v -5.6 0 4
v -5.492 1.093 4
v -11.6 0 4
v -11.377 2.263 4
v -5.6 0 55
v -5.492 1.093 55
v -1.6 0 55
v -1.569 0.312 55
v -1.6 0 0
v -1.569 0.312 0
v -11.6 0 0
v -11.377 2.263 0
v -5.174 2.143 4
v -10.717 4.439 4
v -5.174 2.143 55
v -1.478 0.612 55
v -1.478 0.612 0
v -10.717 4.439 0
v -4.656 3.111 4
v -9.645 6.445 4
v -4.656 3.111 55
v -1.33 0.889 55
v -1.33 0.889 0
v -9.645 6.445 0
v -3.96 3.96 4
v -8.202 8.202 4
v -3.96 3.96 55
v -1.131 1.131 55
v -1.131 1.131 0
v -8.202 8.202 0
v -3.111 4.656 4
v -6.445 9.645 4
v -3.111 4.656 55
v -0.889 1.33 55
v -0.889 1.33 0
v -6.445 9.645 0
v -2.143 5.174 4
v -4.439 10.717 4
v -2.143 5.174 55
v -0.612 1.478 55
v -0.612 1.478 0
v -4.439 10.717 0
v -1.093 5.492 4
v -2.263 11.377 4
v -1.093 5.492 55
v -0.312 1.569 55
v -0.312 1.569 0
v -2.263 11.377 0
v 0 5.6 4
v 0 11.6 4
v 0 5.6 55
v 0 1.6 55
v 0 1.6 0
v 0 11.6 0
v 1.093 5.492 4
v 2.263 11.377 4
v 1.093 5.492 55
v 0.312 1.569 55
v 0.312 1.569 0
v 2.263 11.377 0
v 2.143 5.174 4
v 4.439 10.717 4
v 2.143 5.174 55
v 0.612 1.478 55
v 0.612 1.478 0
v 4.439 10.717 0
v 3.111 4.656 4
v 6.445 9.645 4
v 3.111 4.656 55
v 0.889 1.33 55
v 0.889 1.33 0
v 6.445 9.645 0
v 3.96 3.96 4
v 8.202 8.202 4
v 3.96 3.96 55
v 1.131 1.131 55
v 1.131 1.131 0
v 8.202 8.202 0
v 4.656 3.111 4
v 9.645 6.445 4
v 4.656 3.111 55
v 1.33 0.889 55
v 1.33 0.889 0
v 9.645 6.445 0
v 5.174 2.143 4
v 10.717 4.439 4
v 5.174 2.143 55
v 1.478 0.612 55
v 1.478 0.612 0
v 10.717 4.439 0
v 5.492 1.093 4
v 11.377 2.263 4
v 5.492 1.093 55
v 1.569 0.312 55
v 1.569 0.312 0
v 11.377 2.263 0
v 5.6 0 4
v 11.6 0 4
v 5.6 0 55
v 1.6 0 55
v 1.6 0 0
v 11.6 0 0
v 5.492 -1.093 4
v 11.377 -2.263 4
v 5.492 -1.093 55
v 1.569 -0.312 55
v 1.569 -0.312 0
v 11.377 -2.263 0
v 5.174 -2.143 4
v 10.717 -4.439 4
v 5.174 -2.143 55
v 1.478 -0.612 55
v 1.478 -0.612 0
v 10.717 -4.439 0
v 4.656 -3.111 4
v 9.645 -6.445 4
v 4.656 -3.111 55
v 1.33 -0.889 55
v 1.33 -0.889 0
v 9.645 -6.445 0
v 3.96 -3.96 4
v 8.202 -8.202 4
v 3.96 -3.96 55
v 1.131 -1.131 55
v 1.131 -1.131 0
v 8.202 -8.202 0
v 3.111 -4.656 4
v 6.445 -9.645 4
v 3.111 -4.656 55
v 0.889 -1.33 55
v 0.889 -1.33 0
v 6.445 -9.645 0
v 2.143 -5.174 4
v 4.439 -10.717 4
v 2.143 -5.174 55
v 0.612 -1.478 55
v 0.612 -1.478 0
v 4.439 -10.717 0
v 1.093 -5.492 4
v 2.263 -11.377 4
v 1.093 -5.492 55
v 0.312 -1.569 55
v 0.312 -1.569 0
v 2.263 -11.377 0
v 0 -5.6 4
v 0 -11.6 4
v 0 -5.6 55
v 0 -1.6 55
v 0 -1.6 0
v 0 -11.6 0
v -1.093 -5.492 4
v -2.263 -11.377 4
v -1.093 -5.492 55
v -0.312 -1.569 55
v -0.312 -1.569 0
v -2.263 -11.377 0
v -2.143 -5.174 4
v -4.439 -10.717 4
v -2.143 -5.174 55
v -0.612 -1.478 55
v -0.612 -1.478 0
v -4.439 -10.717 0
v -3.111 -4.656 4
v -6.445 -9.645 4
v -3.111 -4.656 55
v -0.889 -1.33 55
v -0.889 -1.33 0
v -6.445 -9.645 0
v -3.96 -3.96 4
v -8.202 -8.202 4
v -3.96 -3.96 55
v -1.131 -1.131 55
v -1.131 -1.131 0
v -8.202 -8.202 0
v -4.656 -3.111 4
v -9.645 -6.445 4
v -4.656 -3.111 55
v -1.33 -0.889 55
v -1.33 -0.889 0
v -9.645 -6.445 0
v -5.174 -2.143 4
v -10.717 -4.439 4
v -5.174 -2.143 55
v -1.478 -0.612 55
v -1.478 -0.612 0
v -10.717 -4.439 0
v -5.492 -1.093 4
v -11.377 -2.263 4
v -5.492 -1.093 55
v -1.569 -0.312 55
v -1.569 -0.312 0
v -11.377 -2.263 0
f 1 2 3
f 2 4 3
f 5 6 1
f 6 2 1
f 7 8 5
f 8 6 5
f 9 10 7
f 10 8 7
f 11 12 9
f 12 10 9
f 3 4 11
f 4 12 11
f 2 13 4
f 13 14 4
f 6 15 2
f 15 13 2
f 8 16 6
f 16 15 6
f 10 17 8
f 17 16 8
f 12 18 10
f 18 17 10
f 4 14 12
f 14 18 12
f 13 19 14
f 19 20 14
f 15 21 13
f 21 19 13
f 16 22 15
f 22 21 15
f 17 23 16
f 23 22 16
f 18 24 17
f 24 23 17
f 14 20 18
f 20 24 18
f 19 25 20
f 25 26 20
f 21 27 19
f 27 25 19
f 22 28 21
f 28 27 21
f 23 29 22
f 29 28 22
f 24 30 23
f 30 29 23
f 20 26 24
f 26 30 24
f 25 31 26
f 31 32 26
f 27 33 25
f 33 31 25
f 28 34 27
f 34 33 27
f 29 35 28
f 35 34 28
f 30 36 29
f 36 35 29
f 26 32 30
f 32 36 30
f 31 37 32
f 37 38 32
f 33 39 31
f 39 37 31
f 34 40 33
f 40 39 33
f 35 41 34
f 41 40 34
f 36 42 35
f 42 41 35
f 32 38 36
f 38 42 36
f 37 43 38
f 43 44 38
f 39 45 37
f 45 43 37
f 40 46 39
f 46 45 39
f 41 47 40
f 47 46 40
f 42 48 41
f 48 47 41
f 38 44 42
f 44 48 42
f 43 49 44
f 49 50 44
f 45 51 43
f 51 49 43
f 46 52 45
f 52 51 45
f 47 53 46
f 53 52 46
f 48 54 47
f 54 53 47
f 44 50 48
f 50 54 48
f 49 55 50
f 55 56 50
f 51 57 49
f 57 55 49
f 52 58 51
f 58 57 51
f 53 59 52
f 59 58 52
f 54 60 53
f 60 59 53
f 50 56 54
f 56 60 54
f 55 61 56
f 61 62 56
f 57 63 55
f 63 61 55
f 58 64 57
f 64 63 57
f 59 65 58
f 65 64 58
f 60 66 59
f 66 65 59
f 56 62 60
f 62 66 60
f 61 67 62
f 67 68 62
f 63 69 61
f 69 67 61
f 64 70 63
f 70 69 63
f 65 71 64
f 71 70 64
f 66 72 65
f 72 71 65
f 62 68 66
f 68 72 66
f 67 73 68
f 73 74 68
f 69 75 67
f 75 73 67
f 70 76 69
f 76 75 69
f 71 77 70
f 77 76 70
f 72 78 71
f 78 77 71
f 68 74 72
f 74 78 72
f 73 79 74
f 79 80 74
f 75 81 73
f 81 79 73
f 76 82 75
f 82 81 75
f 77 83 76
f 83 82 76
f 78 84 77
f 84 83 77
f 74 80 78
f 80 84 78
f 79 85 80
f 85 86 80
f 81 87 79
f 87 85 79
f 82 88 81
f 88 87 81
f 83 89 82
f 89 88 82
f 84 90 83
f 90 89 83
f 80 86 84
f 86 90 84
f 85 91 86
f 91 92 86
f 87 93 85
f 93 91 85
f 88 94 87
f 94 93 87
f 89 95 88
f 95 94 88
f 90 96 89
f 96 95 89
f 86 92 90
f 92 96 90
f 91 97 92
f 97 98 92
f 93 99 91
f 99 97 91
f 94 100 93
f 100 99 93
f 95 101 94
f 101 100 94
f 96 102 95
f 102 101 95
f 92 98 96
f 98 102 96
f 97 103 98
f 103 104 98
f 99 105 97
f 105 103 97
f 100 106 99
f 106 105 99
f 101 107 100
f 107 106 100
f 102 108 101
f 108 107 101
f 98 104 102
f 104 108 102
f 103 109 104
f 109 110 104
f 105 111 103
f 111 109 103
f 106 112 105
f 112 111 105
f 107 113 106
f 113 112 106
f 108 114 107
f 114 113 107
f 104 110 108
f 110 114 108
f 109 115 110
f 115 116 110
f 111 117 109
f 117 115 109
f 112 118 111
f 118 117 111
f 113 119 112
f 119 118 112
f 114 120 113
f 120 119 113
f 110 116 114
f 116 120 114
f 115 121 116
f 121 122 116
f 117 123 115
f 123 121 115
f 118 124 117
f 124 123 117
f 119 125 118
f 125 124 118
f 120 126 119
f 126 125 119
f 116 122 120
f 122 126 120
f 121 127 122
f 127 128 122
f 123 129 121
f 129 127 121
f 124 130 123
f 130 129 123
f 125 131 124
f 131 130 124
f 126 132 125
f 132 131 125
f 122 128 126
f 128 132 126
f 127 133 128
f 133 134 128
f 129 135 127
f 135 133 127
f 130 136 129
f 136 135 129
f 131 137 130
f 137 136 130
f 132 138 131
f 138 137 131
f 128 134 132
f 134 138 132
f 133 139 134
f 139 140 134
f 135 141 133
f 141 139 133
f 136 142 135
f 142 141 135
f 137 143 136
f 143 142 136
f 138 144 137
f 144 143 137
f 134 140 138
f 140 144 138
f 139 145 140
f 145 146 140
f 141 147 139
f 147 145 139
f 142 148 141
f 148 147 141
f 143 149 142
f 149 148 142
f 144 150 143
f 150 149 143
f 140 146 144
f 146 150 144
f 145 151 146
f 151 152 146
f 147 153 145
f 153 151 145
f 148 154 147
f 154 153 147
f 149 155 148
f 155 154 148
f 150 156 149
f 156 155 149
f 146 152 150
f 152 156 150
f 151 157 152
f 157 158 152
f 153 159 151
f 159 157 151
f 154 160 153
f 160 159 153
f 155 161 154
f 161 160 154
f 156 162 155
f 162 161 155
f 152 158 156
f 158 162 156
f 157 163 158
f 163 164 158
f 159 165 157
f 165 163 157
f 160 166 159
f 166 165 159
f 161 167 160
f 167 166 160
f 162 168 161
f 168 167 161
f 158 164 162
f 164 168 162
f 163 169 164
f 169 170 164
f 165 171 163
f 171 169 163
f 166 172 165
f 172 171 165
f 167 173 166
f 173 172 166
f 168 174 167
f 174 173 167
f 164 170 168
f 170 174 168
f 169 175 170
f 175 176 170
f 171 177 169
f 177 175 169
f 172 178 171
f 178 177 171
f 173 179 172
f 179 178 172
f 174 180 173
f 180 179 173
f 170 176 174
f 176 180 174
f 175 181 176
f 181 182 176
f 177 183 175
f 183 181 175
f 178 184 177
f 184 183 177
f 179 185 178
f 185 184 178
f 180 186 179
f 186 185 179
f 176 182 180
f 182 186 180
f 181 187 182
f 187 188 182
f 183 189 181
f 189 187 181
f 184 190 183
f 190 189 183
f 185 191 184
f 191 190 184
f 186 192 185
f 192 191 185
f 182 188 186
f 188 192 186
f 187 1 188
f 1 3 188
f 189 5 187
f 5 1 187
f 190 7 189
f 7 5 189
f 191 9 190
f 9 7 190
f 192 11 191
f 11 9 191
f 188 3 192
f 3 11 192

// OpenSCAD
$fn = 32;

// ----------------------------------------------------------------------
// Profiled standoff: flanged spacer, 55 mm long, bore 3.2 mm
// ----------------------------------------------------------------------

// --- parameters (mm) ---
revolve_angle = 360;      // full turn around the Z axis
profile_points = 6;       // points of the closed outline

profile = [[1.6, 0], [11.6, 0], [11.6, 4], [5.6, 4], [5.6, 55], [1.6, 55]];  // single closed polygon, 6 points, counter clockwise

// --- the one profile operation ---
rotate_extrude(angle = revolve_angle) polygon(points = profile);
